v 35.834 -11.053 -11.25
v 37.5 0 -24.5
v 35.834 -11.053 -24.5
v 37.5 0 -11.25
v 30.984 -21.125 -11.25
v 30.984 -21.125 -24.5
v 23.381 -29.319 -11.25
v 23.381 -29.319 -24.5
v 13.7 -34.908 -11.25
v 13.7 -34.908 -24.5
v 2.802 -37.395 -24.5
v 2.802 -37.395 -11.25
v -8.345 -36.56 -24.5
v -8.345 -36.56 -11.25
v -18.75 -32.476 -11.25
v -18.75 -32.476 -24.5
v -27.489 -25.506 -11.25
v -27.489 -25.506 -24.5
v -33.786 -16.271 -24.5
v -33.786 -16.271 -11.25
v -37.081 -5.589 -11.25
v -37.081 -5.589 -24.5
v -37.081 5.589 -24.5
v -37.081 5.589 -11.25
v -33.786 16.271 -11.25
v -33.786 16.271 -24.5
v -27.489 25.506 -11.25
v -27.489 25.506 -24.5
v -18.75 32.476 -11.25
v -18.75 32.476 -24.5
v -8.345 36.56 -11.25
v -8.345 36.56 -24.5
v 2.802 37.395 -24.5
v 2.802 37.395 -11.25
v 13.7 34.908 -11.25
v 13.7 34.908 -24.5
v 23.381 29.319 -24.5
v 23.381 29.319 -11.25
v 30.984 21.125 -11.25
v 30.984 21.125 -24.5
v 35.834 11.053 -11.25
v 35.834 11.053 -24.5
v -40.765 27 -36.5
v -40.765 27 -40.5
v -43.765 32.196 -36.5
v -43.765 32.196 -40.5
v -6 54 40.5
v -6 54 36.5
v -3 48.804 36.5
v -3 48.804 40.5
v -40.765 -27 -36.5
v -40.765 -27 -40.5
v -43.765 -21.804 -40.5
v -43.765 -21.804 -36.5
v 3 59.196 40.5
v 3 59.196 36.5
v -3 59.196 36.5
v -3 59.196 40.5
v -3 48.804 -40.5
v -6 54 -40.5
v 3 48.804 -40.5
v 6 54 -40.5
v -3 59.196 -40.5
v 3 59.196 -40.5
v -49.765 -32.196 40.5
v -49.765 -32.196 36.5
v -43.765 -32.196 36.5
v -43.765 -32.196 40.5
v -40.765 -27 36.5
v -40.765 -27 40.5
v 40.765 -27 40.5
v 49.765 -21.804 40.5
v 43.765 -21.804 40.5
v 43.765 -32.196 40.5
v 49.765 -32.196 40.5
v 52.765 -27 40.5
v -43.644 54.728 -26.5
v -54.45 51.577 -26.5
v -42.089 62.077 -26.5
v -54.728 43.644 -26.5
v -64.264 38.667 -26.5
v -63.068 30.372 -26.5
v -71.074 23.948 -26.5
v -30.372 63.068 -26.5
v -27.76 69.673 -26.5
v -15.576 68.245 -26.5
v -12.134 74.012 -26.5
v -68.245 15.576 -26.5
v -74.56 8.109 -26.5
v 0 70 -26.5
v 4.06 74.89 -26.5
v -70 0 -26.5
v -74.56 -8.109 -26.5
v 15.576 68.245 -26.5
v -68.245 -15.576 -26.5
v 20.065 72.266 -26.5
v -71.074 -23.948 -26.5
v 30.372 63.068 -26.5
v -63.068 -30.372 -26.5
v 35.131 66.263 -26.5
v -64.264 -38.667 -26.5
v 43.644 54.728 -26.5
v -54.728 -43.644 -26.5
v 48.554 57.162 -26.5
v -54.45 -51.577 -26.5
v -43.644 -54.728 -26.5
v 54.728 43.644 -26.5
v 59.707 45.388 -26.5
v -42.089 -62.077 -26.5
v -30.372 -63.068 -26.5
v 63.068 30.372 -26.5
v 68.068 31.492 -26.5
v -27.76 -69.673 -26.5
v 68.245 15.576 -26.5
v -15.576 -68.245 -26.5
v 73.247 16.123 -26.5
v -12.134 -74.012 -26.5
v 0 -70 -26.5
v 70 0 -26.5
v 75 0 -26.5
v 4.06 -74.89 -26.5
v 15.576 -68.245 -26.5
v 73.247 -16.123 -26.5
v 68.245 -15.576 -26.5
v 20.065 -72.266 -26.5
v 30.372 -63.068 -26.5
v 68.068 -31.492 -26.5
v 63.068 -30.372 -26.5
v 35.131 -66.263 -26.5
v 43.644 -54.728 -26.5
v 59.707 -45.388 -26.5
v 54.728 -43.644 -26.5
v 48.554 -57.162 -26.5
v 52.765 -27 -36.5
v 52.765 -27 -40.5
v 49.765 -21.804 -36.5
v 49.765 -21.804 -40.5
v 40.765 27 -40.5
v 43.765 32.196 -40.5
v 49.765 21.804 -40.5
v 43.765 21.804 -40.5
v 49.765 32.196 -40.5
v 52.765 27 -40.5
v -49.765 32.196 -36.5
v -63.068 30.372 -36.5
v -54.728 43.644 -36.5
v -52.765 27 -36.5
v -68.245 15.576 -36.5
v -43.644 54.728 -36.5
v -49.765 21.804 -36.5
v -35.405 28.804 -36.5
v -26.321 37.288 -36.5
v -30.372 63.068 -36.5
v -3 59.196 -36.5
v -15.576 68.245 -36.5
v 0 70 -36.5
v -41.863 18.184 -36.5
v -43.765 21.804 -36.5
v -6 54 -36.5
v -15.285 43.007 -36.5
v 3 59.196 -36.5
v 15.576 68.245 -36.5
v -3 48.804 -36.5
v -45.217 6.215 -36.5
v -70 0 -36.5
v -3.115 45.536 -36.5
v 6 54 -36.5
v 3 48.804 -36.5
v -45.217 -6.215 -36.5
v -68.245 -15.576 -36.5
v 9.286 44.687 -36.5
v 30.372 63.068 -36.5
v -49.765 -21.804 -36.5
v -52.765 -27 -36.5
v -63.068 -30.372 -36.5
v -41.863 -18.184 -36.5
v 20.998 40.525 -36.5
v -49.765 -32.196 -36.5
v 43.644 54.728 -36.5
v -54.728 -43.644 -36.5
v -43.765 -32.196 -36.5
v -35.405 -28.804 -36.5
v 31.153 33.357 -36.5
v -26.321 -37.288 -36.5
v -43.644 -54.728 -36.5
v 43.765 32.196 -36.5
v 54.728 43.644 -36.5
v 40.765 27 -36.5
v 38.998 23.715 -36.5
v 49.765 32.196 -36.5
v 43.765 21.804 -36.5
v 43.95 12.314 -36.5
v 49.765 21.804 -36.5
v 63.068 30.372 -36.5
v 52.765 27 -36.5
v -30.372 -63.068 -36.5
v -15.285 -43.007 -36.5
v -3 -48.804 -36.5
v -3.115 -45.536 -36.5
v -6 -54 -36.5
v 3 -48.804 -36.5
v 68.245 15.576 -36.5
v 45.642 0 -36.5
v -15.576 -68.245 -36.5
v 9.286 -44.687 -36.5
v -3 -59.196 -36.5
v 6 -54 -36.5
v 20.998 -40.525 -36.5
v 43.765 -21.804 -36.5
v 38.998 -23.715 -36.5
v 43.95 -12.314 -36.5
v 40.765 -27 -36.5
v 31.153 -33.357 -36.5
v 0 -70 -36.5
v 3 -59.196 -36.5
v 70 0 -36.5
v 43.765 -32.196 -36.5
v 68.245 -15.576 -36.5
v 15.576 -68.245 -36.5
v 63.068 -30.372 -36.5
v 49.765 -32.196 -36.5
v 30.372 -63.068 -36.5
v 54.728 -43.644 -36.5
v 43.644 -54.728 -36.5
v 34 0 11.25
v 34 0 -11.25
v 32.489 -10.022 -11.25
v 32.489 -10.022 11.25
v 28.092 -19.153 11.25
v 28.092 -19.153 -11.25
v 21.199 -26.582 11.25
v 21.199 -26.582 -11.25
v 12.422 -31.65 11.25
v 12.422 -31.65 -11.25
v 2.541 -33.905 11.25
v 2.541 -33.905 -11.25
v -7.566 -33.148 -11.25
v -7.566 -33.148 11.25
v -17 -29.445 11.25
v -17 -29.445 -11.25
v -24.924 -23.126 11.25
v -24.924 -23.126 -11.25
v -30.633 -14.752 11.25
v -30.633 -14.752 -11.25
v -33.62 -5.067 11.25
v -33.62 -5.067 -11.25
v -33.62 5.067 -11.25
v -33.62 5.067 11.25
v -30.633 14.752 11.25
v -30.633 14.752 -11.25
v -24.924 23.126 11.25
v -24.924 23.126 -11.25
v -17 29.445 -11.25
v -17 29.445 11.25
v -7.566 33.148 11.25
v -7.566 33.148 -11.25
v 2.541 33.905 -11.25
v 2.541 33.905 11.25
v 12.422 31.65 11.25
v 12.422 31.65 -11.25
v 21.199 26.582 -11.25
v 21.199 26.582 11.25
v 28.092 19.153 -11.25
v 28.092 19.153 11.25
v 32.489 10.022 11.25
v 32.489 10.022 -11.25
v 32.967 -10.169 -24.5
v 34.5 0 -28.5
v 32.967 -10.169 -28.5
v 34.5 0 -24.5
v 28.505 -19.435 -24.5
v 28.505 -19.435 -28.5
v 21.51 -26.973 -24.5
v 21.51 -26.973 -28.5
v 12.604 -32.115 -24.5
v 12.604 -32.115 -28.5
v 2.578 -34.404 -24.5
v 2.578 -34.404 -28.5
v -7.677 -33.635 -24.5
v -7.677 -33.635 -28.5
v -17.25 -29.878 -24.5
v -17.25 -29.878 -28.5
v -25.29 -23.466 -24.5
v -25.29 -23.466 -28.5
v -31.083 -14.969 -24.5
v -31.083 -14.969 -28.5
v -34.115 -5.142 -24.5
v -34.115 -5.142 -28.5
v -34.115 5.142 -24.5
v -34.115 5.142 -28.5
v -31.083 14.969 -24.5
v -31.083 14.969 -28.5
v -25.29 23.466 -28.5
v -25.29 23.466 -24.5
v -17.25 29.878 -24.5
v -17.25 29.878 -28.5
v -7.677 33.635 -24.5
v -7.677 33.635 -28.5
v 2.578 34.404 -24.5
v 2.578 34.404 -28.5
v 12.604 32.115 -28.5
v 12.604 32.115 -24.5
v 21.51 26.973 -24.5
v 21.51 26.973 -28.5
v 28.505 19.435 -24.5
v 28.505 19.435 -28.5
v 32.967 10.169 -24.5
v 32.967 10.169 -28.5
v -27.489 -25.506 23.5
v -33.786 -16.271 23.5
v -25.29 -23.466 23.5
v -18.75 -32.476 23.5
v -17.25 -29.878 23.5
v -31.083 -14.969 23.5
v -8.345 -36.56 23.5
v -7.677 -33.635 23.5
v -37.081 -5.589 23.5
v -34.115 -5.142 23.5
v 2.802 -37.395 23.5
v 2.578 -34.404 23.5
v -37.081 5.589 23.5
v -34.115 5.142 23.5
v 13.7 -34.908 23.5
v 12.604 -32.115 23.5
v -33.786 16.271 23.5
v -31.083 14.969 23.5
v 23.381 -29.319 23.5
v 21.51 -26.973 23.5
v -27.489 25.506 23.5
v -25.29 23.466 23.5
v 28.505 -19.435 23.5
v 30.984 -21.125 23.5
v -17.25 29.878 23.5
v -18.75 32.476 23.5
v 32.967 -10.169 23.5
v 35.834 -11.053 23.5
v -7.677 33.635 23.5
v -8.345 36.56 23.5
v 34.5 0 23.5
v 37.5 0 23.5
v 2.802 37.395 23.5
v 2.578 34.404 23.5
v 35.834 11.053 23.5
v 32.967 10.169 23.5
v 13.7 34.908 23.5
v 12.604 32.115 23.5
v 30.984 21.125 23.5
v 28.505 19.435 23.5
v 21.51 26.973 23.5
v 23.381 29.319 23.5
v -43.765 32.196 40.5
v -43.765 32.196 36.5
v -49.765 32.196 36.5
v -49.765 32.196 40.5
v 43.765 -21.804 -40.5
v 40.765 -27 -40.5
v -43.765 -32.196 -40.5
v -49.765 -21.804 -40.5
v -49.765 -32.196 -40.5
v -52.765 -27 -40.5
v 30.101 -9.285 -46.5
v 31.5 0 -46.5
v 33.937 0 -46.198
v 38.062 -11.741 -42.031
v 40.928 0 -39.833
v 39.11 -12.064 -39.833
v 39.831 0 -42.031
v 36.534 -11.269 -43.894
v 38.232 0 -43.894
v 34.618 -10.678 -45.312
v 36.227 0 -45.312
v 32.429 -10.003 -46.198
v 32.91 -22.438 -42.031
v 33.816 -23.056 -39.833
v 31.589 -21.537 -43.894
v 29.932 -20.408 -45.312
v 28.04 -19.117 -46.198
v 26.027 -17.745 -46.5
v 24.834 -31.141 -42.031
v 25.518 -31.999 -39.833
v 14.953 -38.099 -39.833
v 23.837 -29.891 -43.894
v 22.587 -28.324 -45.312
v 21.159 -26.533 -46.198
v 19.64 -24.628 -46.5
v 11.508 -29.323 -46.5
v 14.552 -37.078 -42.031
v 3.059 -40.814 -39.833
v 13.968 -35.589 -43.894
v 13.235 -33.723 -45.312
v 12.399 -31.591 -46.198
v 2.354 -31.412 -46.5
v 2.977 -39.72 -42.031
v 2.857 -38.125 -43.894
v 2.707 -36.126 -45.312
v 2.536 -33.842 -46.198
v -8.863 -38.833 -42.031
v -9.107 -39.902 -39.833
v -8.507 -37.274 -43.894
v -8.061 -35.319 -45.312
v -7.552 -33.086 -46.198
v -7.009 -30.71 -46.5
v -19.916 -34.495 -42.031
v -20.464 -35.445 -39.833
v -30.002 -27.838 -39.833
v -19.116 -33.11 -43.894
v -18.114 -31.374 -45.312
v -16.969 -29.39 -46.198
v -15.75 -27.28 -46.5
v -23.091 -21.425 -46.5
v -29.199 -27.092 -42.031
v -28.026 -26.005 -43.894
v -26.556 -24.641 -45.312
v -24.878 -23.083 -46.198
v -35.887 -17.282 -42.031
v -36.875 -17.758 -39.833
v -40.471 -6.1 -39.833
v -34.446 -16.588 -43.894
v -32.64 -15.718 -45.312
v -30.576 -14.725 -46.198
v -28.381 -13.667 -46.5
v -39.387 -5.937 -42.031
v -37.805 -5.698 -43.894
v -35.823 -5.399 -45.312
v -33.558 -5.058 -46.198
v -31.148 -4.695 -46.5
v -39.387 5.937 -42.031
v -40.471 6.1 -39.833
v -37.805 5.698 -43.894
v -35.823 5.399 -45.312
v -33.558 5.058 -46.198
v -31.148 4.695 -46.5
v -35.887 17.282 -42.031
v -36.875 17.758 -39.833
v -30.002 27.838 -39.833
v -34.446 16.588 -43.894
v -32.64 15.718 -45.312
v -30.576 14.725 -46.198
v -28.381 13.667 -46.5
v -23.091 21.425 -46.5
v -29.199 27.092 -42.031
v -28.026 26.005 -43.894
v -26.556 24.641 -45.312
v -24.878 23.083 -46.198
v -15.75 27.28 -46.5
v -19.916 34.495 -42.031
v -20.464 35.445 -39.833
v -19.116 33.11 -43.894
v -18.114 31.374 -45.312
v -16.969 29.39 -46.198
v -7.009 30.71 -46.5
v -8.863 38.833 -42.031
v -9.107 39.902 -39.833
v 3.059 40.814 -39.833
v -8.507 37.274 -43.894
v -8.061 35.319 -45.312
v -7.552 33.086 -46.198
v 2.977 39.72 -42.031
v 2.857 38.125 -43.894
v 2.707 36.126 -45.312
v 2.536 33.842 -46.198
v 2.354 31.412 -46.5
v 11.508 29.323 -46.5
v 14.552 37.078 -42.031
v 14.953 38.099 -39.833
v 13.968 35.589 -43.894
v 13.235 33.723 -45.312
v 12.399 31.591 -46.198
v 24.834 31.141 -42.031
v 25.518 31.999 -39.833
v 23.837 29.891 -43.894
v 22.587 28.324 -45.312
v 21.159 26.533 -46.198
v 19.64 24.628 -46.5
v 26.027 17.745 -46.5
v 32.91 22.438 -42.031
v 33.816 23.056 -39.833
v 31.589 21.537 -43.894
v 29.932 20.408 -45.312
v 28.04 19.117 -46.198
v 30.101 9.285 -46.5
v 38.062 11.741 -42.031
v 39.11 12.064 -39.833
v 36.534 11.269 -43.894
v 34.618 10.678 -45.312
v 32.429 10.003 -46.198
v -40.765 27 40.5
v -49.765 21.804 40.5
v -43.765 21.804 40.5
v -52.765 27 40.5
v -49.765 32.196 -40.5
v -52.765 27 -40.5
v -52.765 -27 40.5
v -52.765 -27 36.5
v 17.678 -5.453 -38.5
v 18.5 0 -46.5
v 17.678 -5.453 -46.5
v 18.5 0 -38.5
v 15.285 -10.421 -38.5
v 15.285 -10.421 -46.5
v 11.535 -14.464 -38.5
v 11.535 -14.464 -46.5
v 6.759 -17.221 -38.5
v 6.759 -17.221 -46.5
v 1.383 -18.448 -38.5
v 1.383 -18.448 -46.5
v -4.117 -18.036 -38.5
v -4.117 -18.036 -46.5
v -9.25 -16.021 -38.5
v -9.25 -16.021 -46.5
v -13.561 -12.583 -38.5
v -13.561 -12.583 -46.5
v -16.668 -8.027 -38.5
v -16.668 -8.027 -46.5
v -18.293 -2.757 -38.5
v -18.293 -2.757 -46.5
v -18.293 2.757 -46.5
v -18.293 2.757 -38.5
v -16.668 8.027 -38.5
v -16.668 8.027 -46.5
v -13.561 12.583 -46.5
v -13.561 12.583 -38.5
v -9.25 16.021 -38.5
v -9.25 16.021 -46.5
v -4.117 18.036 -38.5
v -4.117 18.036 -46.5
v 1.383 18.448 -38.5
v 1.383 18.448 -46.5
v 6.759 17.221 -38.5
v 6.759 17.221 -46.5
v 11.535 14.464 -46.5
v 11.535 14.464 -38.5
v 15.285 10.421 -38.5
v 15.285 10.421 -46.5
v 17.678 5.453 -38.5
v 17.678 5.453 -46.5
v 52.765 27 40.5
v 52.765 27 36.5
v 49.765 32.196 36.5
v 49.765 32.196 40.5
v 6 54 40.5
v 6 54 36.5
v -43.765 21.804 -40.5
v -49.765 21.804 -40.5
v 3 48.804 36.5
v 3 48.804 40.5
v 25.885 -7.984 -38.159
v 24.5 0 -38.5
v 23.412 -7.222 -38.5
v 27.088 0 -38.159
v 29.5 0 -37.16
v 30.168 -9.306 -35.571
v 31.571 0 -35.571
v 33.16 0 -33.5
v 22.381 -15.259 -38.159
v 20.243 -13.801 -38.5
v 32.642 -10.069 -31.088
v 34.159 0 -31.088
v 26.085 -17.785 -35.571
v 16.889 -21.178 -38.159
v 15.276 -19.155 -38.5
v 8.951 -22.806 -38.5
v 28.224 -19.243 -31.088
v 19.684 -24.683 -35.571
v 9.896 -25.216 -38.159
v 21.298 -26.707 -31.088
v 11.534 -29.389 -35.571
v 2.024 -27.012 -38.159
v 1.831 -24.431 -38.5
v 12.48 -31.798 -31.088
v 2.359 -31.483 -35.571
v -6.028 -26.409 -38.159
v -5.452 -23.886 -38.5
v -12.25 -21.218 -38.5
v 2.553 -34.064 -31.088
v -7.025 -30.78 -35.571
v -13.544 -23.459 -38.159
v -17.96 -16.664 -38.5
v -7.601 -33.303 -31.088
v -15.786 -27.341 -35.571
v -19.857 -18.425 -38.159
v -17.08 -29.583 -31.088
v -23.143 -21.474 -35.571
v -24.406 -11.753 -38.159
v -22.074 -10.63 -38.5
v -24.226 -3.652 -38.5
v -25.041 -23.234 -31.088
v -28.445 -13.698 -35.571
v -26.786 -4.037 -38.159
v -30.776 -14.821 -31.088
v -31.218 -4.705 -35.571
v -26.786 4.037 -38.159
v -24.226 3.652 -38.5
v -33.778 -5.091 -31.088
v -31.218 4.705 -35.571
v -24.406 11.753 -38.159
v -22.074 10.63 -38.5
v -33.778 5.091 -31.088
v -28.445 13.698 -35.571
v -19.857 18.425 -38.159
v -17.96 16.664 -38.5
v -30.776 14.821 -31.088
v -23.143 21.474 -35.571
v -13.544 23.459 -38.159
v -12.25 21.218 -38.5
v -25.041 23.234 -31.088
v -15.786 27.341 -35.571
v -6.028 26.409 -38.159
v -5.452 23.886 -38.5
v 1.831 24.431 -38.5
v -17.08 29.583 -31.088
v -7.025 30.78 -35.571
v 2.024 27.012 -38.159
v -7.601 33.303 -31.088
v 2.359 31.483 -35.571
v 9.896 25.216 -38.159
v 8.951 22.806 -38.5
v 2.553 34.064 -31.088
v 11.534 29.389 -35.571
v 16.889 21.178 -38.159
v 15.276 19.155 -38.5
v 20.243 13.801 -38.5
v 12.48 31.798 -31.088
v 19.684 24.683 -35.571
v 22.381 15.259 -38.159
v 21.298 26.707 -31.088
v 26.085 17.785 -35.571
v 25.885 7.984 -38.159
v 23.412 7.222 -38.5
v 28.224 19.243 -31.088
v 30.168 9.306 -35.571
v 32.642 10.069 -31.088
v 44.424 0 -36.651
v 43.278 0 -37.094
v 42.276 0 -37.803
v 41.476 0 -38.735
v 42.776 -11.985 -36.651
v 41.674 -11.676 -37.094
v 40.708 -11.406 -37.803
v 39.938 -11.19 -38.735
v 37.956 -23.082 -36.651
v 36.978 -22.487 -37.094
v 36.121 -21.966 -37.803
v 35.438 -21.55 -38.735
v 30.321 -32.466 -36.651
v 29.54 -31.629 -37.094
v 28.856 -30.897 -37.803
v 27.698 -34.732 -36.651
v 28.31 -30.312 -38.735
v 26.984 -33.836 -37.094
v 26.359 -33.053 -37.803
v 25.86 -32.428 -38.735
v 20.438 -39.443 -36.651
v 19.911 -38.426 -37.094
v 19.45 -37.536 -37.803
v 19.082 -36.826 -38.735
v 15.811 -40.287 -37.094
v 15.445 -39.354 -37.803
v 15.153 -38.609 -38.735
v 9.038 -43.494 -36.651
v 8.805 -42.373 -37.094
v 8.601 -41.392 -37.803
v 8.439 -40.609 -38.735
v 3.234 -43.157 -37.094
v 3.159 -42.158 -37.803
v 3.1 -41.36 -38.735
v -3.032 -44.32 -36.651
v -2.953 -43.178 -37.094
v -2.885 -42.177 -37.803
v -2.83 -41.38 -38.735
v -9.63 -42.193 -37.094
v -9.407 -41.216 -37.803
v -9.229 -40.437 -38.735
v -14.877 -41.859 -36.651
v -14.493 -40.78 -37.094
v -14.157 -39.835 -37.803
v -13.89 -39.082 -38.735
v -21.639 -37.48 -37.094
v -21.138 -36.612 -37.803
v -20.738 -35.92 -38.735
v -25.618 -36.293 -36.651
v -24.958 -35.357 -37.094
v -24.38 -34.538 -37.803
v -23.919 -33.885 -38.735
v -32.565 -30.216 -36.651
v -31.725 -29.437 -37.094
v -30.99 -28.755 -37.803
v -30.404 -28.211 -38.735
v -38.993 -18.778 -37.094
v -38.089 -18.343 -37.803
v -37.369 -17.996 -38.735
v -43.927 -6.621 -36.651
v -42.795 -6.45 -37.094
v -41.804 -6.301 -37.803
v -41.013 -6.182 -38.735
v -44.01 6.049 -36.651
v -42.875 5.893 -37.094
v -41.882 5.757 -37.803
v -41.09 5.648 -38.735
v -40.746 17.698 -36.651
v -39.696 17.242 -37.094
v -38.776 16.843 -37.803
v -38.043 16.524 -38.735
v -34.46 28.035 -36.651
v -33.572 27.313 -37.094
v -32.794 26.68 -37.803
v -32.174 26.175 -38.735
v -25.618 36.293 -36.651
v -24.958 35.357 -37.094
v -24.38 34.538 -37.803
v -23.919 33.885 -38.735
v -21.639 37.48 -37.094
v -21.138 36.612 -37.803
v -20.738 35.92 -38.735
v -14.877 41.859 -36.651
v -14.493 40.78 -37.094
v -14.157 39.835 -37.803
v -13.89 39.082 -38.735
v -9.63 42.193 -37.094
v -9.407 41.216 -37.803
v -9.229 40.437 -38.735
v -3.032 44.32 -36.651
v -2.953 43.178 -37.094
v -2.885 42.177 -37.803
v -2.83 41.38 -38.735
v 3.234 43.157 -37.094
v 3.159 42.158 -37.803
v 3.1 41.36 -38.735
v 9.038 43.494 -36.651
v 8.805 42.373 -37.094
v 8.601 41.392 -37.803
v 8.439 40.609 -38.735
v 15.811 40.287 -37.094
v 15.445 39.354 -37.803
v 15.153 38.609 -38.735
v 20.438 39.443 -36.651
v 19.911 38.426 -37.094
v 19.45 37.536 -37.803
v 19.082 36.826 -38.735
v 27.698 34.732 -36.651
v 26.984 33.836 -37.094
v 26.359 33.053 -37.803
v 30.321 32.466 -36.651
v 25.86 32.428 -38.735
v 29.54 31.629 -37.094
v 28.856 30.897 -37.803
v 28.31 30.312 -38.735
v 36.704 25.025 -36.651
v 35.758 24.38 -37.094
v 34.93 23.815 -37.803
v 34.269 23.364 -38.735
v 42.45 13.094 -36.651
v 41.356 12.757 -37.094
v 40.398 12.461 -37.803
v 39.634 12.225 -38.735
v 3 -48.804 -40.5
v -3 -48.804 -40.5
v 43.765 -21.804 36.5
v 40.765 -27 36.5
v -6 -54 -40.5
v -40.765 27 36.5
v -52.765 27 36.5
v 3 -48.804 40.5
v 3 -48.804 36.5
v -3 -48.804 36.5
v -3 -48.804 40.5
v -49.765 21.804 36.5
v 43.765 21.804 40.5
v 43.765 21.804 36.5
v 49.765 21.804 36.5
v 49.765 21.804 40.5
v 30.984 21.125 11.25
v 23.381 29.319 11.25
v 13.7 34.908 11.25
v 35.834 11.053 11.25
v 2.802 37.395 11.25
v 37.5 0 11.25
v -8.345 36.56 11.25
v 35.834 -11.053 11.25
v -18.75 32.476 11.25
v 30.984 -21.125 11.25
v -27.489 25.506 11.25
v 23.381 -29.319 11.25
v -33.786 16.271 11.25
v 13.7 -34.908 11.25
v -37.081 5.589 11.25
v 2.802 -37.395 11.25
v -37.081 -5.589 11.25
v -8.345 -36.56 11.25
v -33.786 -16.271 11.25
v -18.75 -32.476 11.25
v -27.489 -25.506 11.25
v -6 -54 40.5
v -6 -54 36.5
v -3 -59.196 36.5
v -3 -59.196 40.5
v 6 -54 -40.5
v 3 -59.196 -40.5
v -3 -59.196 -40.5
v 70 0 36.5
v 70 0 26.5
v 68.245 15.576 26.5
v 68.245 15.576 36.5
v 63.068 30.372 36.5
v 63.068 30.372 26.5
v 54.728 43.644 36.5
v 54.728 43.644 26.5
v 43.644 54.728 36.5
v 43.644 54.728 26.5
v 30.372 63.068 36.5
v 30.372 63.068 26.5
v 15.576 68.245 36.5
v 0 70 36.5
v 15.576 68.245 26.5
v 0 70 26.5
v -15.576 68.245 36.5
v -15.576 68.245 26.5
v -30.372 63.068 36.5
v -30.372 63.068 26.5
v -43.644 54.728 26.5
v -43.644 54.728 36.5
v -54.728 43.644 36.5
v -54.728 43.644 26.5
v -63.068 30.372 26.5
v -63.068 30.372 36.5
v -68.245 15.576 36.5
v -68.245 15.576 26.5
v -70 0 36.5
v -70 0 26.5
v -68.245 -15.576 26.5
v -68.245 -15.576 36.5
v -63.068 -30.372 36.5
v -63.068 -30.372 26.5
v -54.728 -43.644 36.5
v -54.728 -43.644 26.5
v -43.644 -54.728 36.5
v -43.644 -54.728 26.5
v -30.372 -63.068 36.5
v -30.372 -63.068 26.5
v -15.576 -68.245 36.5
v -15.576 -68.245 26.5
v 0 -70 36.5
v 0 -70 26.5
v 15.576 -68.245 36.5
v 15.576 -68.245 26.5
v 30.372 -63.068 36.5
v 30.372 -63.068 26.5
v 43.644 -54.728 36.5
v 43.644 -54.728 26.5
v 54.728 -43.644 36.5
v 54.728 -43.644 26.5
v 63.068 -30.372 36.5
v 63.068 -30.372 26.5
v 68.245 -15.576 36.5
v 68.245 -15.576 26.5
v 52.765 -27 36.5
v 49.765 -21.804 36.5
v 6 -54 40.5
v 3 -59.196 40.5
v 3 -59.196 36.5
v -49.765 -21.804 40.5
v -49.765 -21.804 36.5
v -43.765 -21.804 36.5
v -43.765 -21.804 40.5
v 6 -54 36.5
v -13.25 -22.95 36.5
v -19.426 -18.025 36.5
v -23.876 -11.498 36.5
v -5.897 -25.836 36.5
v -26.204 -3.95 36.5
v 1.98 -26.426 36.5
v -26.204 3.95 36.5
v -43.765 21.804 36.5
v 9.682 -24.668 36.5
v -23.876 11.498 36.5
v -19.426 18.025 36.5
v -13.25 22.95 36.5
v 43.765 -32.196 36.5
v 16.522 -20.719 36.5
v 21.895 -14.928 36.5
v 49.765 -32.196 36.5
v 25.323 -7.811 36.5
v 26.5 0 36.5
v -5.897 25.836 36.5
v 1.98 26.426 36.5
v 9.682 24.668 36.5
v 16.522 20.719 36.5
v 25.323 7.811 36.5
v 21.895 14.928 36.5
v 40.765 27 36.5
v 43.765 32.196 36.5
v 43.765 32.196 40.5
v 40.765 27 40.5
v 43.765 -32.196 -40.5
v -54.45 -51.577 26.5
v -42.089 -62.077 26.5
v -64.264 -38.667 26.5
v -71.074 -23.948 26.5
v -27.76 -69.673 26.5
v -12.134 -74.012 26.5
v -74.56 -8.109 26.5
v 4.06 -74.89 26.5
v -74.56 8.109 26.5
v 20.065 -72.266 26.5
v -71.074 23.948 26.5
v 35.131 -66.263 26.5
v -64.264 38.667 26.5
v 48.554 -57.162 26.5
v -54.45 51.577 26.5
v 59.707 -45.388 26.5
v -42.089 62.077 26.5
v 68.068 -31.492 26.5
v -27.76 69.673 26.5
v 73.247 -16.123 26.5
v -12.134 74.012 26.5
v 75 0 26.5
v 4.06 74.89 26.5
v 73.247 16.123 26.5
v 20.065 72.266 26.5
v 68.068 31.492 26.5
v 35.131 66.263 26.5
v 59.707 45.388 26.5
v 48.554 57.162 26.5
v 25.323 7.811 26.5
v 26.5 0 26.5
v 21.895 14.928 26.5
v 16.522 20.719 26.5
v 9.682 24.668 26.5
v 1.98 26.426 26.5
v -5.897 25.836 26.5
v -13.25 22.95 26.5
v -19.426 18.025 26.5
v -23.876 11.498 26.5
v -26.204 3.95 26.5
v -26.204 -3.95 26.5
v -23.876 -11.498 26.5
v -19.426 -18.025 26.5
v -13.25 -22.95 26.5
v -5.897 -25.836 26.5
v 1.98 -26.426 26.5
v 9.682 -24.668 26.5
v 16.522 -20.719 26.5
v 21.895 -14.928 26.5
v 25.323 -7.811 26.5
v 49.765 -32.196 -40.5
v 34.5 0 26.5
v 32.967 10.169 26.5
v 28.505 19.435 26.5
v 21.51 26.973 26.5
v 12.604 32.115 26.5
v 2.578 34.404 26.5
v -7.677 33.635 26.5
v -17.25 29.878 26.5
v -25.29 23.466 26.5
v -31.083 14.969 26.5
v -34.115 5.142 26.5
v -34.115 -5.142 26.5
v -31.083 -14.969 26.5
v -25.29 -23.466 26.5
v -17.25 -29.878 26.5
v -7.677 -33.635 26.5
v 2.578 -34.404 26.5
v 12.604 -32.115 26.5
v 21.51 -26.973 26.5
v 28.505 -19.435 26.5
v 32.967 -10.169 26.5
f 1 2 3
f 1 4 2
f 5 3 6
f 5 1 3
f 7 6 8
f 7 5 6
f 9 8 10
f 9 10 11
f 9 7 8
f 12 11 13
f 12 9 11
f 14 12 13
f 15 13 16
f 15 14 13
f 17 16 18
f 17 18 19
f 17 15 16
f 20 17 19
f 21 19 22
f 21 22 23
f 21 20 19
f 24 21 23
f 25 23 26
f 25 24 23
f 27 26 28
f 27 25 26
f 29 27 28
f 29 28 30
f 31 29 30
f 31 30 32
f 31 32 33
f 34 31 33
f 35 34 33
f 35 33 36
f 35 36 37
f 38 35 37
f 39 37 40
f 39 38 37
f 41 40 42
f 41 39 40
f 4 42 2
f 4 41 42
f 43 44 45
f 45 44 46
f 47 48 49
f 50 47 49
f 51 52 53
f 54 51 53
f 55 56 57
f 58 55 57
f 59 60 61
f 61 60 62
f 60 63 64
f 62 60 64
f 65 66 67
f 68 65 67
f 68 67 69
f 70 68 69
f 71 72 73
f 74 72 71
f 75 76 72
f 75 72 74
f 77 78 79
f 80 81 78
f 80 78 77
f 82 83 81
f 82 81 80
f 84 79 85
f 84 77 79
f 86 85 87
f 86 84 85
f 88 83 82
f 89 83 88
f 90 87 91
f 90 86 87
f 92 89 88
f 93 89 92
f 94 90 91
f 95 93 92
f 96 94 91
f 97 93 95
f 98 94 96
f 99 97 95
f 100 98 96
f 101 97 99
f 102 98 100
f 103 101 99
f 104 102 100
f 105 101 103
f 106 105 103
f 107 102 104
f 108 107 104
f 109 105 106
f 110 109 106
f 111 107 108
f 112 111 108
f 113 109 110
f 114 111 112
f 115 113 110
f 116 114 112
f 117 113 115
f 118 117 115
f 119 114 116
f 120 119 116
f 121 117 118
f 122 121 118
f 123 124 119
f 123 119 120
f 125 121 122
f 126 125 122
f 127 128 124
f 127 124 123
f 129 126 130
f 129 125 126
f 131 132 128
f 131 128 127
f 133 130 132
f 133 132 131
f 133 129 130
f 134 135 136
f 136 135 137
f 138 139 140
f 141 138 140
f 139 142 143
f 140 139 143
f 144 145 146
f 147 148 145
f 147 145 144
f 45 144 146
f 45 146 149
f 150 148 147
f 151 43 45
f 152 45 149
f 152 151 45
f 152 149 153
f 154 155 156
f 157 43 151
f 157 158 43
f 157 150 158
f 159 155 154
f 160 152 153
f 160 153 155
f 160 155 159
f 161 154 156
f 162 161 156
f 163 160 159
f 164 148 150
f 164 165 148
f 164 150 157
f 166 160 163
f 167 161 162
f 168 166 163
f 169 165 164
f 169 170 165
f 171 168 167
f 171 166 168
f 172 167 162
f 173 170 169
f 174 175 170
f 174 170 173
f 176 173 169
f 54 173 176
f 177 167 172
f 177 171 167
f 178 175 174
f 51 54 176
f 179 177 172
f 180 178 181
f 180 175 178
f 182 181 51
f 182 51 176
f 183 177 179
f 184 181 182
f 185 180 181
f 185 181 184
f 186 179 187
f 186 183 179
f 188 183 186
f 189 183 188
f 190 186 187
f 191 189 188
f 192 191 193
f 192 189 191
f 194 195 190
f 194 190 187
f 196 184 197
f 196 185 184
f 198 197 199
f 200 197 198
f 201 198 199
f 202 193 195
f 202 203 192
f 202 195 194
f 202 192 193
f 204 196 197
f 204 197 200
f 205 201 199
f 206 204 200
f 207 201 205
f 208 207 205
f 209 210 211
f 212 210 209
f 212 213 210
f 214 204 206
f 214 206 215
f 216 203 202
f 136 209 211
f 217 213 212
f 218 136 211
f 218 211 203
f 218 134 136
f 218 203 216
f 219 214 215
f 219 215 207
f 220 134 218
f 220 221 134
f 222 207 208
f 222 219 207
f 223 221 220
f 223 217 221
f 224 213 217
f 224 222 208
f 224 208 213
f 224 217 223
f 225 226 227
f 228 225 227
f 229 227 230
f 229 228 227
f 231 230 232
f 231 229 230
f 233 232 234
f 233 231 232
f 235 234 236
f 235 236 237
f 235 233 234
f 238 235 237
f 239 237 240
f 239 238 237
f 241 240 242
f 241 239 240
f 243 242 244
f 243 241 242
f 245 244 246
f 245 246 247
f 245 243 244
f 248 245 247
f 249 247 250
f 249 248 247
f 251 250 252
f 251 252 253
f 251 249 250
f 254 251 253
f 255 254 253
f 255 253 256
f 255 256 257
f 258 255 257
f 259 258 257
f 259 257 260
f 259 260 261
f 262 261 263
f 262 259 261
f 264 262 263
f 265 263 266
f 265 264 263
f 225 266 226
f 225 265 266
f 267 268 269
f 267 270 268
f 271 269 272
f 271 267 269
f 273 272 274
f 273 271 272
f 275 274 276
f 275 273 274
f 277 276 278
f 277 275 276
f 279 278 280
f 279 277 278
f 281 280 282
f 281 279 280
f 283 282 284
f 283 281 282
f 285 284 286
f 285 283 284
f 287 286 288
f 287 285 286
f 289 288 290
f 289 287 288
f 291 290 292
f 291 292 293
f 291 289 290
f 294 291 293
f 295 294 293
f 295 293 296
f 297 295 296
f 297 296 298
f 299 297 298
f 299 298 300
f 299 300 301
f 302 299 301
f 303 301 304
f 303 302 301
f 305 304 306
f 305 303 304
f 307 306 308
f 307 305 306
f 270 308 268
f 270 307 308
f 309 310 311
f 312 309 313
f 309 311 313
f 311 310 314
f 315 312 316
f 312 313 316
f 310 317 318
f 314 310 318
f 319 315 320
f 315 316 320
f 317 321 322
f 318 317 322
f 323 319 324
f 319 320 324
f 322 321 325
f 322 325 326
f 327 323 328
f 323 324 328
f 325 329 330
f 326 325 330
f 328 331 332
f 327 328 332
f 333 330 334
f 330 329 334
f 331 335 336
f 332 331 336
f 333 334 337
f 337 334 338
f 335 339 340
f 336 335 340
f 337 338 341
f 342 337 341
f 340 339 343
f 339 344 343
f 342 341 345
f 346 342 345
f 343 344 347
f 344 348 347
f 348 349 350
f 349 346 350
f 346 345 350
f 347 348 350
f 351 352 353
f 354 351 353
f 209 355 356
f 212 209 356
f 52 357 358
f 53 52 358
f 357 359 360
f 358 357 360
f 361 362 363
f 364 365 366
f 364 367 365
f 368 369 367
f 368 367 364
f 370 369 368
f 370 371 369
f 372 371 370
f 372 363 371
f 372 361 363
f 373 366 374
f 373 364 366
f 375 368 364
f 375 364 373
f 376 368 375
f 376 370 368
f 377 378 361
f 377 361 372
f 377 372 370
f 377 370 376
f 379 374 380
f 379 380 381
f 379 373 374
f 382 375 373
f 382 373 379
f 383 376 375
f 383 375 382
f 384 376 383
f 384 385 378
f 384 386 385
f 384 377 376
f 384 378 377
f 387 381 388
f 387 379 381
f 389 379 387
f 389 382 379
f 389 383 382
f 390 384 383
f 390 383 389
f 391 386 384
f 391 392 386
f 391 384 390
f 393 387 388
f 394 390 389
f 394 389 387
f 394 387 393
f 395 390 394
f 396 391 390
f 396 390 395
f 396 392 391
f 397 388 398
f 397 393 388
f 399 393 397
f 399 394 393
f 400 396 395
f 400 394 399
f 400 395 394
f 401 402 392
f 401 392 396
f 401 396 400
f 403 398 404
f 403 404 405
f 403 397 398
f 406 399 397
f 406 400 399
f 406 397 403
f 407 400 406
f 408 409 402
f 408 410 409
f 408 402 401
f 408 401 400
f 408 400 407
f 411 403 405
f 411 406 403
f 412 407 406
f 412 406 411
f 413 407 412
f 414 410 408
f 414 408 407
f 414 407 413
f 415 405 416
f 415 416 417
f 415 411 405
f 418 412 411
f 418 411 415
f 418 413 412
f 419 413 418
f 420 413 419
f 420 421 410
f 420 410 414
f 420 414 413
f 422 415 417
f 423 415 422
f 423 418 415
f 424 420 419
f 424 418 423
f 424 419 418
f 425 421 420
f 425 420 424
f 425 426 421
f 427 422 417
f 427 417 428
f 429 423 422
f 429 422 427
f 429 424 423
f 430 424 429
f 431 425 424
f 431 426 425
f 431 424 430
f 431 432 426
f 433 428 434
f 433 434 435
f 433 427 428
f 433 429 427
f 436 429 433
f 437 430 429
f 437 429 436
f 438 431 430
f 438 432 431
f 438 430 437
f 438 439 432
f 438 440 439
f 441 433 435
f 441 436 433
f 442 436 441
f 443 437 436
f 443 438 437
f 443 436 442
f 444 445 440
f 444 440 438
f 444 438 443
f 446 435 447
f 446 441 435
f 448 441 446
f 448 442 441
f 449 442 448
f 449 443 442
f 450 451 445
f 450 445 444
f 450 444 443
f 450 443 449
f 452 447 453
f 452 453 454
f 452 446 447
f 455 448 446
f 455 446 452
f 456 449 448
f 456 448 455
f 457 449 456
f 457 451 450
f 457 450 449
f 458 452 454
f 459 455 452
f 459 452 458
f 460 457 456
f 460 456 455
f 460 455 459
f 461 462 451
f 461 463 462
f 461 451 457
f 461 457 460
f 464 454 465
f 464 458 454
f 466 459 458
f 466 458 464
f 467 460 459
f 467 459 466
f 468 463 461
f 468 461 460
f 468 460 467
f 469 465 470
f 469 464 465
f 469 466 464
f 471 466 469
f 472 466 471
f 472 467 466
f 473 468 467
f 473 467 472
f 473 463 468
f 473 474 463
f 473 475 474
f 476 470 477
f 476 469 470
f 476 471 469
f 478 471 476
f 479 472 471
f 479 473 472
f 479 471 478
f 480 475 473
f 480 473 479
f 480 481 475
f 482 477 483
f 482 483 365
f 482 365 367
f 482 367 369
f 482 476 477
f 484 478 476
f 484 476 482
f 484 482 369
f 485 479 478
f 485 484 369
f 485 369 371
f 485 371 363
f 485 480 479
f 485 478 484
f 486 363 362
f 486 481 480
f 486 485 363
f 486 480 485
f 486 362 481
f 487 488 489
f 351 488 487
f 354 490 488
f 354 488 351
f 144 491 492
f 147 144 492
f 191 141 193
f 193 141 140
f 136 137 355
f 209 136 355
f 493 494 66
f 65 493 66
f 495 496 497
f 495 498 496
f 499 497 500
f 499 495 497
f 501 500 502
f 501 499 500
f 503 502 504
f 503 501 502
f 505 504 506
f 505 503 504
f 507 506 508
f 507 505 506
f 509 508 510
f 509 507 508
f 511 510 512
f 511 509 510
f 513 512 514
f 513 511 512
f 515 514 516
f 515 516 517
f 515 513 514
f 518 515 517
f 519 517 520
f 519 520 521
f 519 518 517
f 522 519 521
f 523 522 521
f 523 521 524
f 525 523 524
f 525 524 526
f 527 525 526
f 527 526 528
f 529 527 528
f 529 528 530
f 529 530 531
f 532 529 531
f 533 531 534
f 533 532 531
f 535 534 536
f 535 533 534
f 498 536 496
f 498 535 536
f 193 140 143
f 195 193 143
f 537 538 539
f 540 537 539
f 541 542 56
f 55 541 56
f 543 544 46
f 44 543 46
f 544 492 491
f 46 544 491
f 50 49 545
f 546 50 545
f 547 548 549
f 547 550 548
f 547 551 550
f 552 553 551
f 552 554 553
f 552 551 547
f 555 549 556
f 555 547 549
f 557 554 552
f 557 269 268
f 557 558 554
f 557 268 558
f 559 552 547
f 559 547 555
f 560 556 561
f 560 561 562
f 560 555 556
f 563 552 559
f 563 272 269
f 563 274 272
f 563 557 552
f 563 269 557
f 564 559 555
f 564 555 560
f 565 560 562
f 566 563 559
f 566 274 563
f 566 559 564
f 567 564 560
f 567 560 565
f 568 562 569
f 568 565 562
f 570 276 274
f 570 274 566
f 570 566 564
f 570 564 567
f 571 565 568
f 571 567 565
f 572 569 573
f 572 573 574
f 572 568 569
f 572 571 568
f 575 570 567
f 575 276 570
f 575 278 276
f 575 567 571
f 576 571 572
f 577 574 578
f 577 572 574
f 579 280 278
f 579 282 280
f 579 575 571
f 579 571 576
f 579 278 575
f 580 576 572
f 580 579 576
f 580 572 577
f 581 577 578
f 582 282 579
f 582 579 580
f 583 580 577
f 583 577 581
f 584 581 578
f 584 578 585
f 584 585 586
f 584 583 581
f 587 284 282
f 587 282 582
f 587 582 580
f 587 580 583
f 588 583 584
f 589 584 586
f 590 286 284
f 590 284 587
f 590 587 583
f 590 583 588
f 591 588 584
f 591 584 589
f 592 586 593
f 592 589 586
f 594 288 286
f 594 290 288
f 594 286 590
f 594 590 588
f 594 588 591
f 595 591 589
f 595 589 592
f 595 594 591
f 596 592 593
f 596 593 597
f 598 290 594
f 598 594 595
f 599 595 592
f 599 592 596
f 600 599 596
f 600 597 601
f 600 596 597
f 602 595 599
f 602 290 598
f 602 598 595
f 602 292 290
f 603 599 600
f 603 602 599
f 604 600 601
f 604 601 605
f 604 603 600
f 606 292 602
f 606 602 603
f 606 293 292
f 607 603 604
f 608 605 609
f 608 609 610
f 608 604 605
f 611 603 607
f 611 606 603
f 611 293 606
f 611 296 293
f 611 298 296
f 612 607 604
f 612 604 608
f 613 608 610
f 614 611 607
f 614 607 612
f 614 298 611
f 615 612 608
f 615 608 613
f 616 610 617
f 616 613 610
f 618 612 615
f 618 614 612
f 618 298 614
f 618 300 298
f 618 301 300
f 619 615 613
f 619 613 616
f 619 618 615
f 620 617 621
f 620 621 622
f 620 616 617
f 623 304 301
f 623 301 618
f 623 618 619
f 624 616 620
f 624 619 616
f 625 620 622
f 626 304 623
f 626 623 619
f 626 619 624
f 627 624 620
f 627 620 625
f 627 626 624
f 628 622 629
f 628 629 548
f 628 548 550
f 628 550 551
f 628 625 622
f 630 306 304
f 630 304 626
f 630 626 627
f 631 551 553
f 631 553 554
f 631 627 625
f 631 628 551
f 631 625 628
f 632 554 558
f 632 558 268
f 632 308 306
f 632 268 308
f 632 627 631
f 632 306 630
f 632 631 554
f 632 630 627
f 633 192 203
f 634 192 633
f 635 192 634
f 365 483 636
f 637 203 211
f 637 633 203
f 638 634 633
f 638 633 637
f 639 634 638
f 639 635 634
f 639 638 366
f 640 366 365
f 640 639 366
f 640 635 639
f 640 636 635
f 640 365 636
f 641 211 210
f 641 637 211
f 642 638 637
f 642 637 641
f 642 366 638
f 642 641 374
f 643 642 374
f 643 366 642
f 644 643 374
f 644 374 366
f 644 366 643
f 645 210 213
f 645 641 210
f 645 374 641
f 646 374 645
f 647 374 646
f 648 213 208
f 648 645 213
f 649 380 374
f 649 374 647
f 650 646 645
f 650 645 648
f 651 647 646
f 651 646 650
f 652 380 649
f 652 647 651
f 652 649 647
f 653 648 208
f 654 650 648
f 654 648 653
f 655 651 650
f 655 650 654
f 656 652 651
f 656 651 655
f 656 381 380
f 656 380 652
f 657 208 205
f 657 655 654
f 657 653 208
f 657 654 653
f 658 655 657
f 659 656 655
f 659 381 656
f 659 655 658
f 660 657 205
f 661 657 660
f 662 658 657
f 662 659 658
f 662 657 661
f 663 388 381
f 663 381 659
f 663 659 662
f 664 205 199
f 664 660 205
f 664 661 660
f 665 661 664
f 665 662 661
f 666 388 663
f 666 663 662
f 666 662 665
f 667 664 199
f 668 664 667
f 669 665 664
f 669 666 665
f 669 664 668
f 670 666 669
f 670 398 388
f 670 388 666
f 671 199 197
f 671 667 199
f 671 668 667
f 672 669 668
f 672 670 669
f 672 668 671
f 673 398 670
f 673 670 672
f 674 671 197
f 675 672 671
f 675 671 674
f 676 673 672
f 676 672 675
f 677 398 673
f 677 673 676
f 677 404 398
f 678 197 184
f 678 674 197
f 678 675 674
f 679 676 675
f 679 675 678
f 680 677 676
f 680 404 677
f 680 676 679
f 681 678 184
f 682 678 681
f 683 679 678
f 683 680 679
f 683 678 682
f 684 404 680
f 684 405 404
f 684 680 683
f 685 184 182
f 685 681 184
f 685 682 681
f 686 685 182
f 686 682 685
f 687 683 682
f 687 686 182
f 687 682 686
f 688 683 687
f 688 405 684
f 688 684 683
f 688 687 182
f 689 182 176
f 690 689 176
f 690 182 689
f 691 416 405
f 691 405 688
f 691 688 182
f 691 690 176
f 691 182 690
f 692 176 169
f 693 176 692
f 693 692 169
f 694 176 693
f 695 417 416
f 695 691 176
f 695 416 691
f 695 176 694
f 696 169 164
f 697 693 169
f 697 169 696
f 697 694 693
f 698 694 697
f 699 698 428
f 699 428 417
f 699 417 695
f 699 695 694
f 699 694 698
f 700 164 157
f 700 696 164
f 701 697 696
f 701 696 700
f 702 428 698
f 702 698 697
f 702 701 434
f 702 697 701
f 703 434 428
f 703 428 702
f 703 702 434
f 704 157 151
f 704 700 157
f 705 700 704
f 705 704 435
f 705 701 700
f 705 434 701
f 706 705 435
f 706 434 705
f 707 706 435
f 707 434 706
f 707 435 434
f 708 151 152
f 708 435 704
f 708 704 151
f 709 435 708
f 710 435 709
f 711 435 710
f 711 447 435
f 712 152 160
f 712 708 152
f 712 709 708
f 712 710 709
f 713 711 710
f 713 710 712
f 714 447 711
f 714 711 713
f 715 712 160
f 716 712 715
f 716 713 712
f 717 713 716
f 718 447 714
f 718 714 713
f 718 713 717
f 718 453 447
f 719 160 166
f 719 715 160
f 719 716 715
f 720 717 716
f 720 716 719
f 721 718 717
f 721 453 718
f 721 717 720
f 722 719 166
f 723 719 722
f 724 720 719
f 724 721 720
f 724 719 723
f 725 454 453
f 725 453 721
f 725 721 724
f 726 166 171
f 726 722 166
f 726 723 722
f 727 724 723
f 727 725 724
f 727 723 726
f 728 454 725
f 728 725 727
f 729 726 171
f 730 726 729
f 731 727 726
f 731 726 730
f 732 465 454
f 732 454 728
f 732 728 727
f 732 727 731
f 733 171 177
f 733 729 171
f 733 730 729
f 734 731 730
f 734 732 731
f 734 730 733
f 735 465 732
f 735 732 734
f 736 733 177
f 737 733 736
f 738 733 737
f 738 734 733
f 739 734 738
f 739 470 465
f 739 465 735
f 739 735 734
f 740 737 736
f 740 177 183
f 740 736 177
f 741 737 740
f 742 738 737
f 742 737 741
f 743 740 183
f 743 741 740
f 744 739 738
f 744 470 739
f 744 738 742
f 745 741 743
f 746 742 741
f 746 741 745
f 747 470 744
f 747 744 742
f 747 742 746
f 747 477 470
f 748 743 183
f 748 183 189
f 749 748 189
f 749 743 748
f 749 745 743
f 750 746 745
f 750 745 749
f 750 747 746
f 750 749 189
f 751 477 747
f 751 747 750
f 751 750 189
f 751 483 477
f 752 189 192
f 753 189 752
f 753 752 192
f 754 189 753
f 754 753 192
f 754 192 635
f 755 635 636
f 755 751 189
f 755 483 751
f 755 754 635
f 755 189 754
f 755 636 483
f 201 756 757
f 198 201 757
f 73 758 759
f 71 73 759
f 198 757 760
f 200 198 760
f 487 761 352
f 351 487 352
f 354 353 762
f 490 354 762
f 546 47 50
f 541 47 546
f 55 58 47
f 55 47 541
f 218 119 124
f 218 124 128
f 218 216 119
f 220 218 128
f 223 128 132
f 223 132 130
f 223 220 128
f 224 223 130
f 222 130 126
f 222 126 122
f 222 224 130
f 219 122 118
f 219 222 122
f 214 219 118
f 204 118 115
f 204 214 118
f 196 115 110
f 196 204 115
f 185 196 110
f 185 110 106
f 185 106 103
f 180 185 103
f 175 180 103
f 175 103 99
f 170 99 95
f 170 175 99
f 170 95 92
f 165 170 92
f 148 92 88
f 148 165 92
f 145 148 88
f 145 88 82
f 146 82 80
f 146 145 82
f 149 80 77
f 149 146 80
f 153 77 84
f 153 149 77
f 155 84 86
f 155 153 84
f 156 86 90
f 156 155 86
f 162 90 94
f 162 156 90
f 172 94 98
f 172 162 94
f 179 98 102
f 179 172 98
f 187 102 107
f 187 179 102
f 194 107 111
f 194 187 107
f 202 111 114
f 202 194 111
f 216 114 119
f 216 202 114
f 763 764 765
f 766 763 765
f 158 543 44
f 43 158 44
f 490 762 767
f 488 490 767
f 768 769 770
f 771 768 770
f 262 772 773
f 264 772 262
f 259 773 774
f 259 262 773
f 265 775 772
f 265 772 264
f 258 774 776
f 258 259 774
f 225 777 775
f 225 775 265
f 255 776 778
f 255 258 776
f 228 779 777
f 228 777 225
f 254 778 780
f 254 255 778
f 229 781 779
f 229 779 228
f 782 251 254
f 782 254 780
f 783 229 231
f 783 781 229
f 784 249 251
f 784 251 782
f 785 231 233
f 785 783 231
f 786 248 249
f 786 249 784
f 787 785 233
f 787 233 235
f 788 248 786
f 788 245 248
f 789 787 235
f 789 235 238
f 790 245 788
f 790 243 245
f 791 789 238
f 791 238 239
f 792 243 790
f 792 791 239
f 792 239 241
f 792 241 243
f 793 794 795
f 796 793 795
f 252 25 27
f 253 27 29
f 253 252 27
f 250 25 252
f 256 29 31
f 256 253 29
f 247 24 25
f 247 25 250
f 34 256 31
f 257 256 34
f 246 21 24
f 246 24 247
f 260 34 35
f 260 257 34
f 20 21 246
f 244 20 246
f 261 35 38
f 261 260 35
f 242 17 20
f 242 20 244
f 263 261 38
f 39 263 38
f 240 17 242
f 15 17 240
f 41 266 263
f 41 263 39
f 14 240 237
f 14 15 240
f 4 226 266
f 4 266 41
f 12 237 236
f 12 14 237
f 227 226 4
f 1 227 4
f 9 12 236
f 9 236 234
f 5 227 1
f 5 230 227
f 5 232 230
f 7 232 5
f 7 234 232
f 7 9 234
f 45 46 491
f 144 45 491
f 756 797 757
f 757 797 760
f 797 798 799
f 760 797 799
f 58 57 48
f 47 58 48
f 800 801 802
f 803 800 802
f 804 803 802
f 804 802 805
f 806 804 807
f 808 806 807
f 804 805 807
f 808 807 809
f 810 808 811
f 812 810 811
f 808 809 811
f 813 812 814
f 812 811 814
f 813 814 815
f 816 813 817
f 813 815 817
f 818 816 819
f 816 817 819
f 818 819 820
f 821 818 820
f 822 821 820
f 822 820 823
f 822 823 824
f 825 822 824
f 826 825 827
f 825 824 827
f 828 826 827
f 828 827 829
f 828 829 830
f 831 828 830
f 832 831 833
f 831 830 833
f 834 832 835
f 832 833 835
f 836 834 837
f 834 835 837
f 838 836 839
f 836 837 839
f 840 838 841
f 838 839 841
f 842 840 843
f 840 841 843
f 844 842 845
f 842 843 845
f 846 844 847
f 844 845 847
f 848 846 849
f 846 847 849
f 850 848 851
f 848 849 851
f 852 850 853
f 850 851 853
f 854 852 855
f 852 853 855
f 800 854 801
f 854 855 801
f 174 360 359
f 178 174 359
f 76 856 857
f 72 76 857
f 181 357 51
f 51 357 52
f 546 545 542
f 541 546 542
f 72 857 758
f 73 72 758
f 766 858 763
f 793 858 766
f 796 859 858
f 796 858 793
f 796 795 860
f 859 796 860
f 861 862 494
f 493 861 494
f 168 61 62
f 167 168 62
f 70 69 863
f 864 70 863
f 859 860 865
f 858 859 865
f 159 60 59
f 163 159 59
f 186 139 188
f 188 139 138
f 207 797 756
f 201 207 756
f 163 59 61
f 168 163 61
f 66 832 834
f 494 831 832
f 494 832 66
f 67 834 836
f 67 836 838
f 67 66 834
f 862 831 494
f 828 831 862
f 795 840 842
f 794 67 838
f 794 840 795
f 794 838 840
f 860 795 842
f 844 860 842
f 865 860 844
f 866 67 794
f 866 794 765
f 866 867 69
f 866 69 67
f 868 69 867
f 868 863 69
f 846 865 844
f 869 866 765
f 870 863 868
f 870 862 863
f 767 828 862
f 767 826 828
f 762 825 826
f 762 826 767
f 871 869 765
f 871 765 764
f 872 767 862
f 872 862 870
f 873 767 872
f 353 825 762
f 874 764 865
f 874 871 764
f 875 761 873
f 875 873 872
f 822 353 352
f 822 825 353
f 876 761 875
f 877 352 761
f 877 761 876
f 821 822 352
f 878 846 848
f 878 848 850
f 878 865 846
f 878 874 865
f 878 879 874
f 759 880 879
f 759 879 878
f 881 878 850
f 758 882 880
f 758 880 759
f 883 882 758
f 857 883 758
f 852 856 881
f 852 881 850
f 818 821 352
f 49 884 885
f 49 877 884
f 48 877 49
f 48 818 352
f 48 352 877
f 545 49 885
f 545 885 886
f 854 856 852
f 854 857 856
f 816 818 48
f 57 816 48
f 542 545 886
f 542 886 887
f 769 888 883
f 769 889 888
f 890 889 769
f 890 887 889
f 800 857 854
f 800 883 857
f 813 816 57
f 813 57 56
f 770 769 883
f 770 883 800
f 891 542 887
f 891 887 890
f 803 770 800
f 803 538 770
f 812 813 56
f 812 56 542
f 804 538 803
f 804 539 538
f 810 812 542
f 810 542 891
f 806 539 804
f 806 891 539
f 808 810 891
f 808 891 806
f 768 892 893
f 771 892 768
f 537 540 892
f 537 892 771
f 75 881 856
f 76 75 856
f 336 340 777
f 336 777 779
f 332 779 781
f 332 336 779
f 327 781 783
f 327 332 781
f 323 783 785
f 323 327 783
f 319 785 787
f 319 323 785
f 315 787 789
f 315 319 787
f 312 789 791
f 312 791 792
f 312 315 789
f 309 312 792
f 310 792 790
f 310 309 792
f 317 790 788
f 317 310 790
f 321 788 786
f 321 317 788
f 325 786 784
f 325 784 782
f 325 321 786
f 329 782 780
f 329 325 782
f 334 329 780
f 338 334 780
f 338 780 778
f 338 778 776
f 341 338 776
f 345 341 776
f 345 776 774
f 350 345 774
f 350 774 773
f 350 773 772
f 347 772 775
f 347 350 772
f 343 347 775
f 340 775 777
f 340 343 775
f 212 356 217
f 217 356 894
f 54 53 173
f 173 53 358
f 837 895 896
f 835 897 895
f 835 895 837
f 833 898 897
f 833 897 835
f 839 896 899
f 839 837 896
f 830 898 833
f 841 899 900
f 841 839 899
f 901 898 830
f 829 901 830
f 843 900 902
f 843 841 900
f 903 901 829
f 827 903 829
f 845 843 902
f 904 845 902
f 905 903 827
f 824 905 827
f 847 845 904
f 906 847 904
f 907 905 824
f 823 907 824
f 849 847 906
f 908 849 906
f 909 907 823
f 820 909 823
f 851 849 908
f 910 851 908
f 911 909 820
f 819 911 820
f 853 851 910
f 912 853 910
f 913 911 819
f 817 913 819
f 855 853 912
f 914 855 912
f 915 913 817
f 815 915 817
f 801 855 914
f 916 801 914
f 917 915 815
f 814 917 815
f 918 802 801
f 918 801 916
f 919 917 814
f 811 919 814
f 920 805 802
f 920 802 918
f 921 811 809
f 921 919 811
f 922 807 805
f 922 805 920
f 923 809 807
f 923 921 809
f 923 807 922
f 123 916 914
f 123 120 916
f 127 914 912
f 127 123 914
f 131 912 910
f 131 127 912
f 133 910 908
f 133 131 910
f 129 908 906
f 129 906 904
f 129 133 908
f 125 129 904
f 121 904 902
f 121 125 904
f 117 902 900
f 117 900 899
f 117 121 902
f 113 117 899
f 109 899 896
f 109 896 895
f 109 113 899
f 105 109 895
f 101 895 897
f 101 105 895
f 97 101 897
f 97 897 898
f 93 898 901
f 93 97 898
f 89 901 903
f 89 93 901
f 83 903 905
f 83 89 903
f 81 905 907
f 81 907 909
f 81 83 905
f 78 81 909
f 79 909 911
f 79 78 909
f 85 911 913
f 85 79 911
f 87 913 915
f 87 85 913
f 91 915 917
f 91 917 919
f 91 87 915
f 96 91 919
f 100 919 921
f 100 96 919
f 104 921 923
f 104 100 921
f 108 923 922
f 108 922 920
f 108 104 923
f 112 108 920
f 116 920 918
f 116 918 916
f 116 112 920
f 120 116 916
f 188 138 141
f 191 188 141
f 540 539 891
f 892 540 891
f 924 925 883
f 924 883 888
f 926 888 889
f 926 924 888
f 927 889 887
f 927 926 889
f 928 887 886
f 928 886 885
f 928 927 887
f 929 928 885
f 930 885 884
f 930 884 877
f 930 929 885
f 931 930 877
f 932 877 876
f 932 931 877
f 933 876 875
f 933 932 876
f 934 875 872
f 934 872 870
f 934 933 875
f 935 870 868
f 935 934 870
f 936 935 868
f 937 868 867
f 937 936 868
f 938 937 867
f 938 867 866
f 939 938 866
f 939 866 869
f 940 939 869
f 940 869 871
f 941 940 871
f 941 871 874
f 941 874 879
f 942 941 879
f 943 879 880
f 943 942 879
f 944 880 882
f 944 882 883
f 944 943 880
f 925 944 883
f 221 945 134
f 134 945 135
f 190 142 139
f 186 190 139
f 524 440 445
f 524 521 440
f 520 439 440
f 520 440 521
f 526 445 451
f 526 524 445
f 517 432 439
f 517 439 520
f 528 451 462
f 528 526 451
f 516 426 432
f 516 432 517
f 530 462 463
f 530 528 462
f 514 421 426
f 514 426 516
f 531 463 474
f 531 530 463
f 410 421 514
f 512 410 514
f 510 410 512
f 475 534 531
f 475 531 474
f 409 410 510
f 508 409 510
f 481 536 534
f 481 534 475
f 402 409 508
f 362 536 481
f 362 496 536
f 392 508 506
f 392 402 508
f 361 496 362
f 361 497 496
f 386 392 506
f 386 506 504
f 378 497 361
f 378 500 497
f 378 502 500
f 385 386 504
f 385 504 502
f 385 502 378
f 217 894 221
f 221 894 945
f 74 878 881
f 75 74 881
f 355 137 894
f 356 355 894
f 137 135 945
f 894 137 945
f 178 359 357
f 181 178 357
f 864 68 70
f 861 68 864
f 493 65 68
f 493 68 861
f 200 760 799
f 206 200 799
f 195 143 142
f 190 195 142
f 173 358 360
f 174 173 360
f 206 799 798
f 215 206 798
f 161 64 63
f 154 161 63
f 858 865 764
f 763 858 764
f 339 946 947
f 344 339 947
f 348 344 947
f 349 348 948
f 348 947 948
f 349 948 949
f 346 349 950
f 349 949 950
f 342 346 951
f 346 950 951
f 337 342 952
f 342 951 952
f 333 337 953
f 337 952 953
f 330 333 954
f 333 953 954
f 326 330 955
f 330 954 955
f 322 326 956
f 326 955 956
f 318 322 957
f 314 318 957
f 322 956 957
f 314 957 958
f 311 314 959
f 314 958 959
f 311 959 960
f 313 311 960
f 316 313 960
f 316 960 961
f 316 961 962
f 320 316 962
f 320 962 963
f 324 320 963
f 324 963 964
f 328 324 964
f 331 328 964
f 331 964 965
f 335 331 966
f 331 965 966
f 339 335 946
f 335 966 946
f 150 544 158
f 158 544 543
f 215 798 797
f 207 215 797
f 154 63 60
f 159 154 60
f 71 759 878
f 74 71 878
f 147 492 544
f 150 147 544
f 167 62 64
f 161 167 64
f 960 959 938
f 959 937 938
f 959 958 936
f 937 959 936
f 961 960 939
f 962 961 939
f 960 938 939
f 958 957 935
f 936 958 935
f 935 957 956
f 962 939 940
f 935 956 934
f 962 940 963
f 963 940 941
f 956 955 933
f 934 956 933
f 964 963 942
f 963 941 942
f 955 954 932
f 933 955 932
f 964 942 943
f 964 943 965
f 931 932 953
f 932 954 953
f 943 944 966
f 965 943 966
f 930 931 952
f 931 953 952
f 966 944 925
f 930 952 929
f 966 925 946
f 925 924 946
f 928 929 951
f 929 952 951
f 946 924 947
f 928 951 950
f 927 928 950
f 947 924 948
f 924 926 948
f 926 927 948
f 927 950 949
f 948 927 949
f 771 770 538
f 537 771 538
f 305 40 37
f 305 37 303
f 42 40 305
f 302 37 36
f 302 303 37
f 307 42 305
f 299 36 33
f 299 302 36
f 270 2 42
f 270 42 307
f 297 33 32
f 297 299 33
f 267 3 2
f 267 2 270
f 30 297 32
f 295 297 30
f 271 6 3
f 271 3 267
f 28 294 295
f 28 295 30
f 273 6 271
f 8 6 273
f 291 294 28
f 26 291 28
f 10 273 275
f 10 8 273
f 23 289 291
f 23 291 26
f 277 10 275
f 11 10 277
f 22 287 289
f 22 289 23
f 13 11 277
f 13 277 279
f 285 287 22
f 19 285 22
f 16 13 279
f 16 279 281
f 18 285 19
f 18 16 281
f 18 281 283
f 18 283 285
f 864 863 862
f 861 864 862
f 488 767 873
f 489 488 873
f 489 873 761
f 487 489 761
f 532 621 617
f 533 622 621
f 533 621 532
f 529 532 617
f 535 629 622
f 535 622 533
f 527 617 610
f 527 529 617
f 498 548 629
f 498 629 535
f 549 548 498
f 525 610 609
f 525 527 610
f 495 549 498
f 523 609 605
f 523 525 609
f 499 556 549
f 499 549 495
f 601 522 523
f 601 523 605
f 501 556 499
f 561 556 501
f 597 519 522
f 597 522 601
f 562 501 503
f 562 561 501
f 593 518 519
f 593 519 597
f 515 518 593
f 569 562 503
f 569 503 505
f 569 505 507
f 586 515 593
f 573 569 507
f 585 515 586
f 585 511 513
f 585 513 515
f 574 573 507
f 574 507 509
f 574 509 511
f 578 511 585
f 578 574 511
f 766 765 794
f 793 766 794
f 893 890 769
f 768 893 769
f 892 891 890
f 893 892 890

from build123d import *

# Parameters (mm, degrees)
SKETCH_2_R                    = 37.5
SKETCH_2_R_2                  = 34.5
EXTRUDE_1_DEPTH               = 3
SKETCH_3_R                    = 70
SKETCH_3_R_2                  = 26.5
EXTRUDE_2_DEPTH               = 10
EXTRUDE_3_DEPTH               = 4
PATTERN_CIRCULAR_1_COUNT      = 6
PATTERN_LINEAR_1_COUNT        = 2
PATTERN_LINEAR_1_PITCH        = 77
PATTERN_LINEAR_1_COPY_1_DEPTH = 4
PATTERN_LINEAR_1_COPY_2_DEPTH = 4
PATTERN_LINEAR_1_COPY_3_DEPTH = 4
PATTERN_LINEAR_1_COPY_4_DEPTH = 4
PATTERN_LINEAR_1_COPY_5_DEPTH = 4


with BuildPart() as part:
    # 草图1 → 旋转1 (revolve)
    with BuildSketch(Plane(origin=(0, 0, 0), x_dir=(1, 0, 0), z_dir=(0, 1, 0))):
        Polygon((37.5, 26.5), (37.5, 11.25), (34, 11.25), (34, -11.25), (37.5, -11.25), (37.5, -26.5), (75, -26.5), (75, 26.5), align=None)
    revolve(axis=Axis((0, 0, 1000), (0, 0, -1)))

    # 草图2 → 凸台-拉伸1 (add)
    with BuildSketch(Plane.XY.offset(26.5)):
        Circle(SKETCH_2_R)
        Circle(SKETCH_2_R_2, mode=Mode.SUBTRACT)
    extrude(amount=-EXTRUDE_1_DEPTH)

    # 草图3 → 凸台-拉伸2 (add)
    with BuildSketch(Plane.XY.offset(26.5)):
        Circle(SKETCH_3_R)
        Circle(SKETCH_3_R_2, mode=Mode.SUBTRACT)
    extrude(amount=EXTRUDE_2_DEPTH)

    # 草图4 → 旋转2 (revolve)
    with BuildSketch(Plane(origin=(0, 0, 0), x_dir=(0, 0, -1), z_dir=(1, 0, 0)), mode=Mode.PRIVATE) as revolve_2_sk:
        with BuildLine():
            Line((26.5, 37.5), (26.5, 70))
            Line((26.5, 70), (36.5, 70))
            Line((36.5, 70), (36.5, 45.642135624))
            ThreePointArc((36.5, 45.642135624), (37.417517095, 42.755384278), (39.833333333, 40.928090416))
            ThreePointArc((39.833333333, 40.928090416), (44.664965809, 37.273502692), (46.5, 31.5))
            Line((46.5, 31.5), (46.5, 18.5))
            Line((46.5, 18.5), (38.5, 18.5))
            Line((38.5, 18.5), (38.5, 24.5))
            ThreePointArc((38.5, 24.5), (35.571067812, 31.571067812), (28.5, 34.5))
            Line((28.5, 34.5), (24.5, 34.5))
            Line((24.5, 34.5), (24.5, 37.5))
            Line((24.5, 37.5), (26.5, 37.5))
        make_face()
    revolve(revolve_2_sk.sketch.rotate(Axis((0, 0, 1000), (0, 0, -1)), 90), axis=Axis((0, 0, 1000), (0, 0, -1)))

    # 草图5 → 凸台-拉伸3 (add)
    with BuildSketch(Plane.XY.offset(36.5)):
        Polygon((3, 48.803847577), (6, 54), (3, 59.196152423), (-3, 59.196152423), (-6, 54), (-3, 48.803847577), align=None)
    extrude_3 = extrude(amount=EXTRUDE_3_DEPTH)

    # 阵列(圆周)1: 凸台-拉伸3 ×6 about axis
    pattern_circular_1_axis = Axis((0, 0, 0), (0, 0, 1))
    for i in range(1, PATTERN_CIRCULAR_1_COUNT):
        add(extrude_3.rotate(pattern_circular_1_axis, i * 360 / PATTERN_CIRCULAR_1_COUNT))

    # 阵列(线性)1: 凸台-拉伸3 ×2
    with Locations(*[(0, 0, -i * PATTERN_LINEAR_1_PITCH) for i in range(1, PATTERN_LINEAR_1_COUNT)]):
        add(extrude_3)

    # 阵列(线性)1 copy 1 sketch → 阵列(线性)1 copy 1 (add)
    with BuildSketch(Plane(origin=(0, 0, -40.5), x_dir=(0.5000000000000001, 0.8660254037844386, 0), z_dir=(0, 0, 1))):
        Polygon((3, 48.803847577), (6, 54), (3, 59.196152423), (-3, 59.196152423), (-6, 54), (-3, 48.803847577), align=None)
    extrude(amount=PATTERN_LINEAR_1_COPY_1_DEPTH)

    # 阵列(线性)1 copy 2 sketch → 阵列(线性)1 copy 2 (add)
    with BuildSketch(Plane(origin=(0, 0, -40.5), x_dir=(-0.4999999999999998, 0.8660254037844387, 0), z_dir=(0, 0, 1))):
        Polygon((3, 48.803847577), (6, 54), (3, 59.196152423), (-3, 59.196152423), (-6, 54), (-3, 48.803847577), align=None)
    extrude(amount=PATTERN_LINEAR_1_COPY_2_DEPTH)

    # 阵列(线性)1 copy 3 sketch → 阵列(线性)1 copy 3 (add)
    with BuildSketch(Plane(origin=(0, 0, -40.5), x_dir=(-1, 0, 0), z_dir=(0, 0, 1))):
        Polygon((3, 48.803847577), (6, 54), (3, 59.196152423), (-3, 59.196152423), (-6, 54), (-3, 48.803847577), align=None)
    extrude(amount=PATTERN_LINEAR_1_COPY_3_DEPTH)

    # 阵列(线性)1 copy 4 sketch → 阵列(线性)1 copy 4 (add)
    with BuildSketch(Plane(origin=(0, 0, -40.5), x_dir=(-0.5000000000000004, -0.8660254037844384, 0), z_dir=(0, 0, 1))):
        Polygon((3, 48.803847577), (6, 54), (3, 59.196152423), (-3, 59.196152423), (-6, 54), (-3, 48.803847577), align=None)
    extrude(amount=PATTERN_LINEAR_1_COPY_4_DEPTH)

    # 阵列(线性)1 copy 5 sketch → 阵列(线性)1 copy 5 (add)
    with BuildSketch(Plane(origin=(0, 0, -40.5), x_dir=(0.5000000000000001, -0.8660254037844386, 0), z_dir=(0, 0, 1))):
        Polygon((3, 48.803847577), (6, 54), (3, 59.196152423), (-3, 59.196152423), (-6, 54), (-3, 48.803847577), align=None)
    extrude(amount=PATTERN_LINEAR_1_COPY_5_DEPTH)


solid = part.part
